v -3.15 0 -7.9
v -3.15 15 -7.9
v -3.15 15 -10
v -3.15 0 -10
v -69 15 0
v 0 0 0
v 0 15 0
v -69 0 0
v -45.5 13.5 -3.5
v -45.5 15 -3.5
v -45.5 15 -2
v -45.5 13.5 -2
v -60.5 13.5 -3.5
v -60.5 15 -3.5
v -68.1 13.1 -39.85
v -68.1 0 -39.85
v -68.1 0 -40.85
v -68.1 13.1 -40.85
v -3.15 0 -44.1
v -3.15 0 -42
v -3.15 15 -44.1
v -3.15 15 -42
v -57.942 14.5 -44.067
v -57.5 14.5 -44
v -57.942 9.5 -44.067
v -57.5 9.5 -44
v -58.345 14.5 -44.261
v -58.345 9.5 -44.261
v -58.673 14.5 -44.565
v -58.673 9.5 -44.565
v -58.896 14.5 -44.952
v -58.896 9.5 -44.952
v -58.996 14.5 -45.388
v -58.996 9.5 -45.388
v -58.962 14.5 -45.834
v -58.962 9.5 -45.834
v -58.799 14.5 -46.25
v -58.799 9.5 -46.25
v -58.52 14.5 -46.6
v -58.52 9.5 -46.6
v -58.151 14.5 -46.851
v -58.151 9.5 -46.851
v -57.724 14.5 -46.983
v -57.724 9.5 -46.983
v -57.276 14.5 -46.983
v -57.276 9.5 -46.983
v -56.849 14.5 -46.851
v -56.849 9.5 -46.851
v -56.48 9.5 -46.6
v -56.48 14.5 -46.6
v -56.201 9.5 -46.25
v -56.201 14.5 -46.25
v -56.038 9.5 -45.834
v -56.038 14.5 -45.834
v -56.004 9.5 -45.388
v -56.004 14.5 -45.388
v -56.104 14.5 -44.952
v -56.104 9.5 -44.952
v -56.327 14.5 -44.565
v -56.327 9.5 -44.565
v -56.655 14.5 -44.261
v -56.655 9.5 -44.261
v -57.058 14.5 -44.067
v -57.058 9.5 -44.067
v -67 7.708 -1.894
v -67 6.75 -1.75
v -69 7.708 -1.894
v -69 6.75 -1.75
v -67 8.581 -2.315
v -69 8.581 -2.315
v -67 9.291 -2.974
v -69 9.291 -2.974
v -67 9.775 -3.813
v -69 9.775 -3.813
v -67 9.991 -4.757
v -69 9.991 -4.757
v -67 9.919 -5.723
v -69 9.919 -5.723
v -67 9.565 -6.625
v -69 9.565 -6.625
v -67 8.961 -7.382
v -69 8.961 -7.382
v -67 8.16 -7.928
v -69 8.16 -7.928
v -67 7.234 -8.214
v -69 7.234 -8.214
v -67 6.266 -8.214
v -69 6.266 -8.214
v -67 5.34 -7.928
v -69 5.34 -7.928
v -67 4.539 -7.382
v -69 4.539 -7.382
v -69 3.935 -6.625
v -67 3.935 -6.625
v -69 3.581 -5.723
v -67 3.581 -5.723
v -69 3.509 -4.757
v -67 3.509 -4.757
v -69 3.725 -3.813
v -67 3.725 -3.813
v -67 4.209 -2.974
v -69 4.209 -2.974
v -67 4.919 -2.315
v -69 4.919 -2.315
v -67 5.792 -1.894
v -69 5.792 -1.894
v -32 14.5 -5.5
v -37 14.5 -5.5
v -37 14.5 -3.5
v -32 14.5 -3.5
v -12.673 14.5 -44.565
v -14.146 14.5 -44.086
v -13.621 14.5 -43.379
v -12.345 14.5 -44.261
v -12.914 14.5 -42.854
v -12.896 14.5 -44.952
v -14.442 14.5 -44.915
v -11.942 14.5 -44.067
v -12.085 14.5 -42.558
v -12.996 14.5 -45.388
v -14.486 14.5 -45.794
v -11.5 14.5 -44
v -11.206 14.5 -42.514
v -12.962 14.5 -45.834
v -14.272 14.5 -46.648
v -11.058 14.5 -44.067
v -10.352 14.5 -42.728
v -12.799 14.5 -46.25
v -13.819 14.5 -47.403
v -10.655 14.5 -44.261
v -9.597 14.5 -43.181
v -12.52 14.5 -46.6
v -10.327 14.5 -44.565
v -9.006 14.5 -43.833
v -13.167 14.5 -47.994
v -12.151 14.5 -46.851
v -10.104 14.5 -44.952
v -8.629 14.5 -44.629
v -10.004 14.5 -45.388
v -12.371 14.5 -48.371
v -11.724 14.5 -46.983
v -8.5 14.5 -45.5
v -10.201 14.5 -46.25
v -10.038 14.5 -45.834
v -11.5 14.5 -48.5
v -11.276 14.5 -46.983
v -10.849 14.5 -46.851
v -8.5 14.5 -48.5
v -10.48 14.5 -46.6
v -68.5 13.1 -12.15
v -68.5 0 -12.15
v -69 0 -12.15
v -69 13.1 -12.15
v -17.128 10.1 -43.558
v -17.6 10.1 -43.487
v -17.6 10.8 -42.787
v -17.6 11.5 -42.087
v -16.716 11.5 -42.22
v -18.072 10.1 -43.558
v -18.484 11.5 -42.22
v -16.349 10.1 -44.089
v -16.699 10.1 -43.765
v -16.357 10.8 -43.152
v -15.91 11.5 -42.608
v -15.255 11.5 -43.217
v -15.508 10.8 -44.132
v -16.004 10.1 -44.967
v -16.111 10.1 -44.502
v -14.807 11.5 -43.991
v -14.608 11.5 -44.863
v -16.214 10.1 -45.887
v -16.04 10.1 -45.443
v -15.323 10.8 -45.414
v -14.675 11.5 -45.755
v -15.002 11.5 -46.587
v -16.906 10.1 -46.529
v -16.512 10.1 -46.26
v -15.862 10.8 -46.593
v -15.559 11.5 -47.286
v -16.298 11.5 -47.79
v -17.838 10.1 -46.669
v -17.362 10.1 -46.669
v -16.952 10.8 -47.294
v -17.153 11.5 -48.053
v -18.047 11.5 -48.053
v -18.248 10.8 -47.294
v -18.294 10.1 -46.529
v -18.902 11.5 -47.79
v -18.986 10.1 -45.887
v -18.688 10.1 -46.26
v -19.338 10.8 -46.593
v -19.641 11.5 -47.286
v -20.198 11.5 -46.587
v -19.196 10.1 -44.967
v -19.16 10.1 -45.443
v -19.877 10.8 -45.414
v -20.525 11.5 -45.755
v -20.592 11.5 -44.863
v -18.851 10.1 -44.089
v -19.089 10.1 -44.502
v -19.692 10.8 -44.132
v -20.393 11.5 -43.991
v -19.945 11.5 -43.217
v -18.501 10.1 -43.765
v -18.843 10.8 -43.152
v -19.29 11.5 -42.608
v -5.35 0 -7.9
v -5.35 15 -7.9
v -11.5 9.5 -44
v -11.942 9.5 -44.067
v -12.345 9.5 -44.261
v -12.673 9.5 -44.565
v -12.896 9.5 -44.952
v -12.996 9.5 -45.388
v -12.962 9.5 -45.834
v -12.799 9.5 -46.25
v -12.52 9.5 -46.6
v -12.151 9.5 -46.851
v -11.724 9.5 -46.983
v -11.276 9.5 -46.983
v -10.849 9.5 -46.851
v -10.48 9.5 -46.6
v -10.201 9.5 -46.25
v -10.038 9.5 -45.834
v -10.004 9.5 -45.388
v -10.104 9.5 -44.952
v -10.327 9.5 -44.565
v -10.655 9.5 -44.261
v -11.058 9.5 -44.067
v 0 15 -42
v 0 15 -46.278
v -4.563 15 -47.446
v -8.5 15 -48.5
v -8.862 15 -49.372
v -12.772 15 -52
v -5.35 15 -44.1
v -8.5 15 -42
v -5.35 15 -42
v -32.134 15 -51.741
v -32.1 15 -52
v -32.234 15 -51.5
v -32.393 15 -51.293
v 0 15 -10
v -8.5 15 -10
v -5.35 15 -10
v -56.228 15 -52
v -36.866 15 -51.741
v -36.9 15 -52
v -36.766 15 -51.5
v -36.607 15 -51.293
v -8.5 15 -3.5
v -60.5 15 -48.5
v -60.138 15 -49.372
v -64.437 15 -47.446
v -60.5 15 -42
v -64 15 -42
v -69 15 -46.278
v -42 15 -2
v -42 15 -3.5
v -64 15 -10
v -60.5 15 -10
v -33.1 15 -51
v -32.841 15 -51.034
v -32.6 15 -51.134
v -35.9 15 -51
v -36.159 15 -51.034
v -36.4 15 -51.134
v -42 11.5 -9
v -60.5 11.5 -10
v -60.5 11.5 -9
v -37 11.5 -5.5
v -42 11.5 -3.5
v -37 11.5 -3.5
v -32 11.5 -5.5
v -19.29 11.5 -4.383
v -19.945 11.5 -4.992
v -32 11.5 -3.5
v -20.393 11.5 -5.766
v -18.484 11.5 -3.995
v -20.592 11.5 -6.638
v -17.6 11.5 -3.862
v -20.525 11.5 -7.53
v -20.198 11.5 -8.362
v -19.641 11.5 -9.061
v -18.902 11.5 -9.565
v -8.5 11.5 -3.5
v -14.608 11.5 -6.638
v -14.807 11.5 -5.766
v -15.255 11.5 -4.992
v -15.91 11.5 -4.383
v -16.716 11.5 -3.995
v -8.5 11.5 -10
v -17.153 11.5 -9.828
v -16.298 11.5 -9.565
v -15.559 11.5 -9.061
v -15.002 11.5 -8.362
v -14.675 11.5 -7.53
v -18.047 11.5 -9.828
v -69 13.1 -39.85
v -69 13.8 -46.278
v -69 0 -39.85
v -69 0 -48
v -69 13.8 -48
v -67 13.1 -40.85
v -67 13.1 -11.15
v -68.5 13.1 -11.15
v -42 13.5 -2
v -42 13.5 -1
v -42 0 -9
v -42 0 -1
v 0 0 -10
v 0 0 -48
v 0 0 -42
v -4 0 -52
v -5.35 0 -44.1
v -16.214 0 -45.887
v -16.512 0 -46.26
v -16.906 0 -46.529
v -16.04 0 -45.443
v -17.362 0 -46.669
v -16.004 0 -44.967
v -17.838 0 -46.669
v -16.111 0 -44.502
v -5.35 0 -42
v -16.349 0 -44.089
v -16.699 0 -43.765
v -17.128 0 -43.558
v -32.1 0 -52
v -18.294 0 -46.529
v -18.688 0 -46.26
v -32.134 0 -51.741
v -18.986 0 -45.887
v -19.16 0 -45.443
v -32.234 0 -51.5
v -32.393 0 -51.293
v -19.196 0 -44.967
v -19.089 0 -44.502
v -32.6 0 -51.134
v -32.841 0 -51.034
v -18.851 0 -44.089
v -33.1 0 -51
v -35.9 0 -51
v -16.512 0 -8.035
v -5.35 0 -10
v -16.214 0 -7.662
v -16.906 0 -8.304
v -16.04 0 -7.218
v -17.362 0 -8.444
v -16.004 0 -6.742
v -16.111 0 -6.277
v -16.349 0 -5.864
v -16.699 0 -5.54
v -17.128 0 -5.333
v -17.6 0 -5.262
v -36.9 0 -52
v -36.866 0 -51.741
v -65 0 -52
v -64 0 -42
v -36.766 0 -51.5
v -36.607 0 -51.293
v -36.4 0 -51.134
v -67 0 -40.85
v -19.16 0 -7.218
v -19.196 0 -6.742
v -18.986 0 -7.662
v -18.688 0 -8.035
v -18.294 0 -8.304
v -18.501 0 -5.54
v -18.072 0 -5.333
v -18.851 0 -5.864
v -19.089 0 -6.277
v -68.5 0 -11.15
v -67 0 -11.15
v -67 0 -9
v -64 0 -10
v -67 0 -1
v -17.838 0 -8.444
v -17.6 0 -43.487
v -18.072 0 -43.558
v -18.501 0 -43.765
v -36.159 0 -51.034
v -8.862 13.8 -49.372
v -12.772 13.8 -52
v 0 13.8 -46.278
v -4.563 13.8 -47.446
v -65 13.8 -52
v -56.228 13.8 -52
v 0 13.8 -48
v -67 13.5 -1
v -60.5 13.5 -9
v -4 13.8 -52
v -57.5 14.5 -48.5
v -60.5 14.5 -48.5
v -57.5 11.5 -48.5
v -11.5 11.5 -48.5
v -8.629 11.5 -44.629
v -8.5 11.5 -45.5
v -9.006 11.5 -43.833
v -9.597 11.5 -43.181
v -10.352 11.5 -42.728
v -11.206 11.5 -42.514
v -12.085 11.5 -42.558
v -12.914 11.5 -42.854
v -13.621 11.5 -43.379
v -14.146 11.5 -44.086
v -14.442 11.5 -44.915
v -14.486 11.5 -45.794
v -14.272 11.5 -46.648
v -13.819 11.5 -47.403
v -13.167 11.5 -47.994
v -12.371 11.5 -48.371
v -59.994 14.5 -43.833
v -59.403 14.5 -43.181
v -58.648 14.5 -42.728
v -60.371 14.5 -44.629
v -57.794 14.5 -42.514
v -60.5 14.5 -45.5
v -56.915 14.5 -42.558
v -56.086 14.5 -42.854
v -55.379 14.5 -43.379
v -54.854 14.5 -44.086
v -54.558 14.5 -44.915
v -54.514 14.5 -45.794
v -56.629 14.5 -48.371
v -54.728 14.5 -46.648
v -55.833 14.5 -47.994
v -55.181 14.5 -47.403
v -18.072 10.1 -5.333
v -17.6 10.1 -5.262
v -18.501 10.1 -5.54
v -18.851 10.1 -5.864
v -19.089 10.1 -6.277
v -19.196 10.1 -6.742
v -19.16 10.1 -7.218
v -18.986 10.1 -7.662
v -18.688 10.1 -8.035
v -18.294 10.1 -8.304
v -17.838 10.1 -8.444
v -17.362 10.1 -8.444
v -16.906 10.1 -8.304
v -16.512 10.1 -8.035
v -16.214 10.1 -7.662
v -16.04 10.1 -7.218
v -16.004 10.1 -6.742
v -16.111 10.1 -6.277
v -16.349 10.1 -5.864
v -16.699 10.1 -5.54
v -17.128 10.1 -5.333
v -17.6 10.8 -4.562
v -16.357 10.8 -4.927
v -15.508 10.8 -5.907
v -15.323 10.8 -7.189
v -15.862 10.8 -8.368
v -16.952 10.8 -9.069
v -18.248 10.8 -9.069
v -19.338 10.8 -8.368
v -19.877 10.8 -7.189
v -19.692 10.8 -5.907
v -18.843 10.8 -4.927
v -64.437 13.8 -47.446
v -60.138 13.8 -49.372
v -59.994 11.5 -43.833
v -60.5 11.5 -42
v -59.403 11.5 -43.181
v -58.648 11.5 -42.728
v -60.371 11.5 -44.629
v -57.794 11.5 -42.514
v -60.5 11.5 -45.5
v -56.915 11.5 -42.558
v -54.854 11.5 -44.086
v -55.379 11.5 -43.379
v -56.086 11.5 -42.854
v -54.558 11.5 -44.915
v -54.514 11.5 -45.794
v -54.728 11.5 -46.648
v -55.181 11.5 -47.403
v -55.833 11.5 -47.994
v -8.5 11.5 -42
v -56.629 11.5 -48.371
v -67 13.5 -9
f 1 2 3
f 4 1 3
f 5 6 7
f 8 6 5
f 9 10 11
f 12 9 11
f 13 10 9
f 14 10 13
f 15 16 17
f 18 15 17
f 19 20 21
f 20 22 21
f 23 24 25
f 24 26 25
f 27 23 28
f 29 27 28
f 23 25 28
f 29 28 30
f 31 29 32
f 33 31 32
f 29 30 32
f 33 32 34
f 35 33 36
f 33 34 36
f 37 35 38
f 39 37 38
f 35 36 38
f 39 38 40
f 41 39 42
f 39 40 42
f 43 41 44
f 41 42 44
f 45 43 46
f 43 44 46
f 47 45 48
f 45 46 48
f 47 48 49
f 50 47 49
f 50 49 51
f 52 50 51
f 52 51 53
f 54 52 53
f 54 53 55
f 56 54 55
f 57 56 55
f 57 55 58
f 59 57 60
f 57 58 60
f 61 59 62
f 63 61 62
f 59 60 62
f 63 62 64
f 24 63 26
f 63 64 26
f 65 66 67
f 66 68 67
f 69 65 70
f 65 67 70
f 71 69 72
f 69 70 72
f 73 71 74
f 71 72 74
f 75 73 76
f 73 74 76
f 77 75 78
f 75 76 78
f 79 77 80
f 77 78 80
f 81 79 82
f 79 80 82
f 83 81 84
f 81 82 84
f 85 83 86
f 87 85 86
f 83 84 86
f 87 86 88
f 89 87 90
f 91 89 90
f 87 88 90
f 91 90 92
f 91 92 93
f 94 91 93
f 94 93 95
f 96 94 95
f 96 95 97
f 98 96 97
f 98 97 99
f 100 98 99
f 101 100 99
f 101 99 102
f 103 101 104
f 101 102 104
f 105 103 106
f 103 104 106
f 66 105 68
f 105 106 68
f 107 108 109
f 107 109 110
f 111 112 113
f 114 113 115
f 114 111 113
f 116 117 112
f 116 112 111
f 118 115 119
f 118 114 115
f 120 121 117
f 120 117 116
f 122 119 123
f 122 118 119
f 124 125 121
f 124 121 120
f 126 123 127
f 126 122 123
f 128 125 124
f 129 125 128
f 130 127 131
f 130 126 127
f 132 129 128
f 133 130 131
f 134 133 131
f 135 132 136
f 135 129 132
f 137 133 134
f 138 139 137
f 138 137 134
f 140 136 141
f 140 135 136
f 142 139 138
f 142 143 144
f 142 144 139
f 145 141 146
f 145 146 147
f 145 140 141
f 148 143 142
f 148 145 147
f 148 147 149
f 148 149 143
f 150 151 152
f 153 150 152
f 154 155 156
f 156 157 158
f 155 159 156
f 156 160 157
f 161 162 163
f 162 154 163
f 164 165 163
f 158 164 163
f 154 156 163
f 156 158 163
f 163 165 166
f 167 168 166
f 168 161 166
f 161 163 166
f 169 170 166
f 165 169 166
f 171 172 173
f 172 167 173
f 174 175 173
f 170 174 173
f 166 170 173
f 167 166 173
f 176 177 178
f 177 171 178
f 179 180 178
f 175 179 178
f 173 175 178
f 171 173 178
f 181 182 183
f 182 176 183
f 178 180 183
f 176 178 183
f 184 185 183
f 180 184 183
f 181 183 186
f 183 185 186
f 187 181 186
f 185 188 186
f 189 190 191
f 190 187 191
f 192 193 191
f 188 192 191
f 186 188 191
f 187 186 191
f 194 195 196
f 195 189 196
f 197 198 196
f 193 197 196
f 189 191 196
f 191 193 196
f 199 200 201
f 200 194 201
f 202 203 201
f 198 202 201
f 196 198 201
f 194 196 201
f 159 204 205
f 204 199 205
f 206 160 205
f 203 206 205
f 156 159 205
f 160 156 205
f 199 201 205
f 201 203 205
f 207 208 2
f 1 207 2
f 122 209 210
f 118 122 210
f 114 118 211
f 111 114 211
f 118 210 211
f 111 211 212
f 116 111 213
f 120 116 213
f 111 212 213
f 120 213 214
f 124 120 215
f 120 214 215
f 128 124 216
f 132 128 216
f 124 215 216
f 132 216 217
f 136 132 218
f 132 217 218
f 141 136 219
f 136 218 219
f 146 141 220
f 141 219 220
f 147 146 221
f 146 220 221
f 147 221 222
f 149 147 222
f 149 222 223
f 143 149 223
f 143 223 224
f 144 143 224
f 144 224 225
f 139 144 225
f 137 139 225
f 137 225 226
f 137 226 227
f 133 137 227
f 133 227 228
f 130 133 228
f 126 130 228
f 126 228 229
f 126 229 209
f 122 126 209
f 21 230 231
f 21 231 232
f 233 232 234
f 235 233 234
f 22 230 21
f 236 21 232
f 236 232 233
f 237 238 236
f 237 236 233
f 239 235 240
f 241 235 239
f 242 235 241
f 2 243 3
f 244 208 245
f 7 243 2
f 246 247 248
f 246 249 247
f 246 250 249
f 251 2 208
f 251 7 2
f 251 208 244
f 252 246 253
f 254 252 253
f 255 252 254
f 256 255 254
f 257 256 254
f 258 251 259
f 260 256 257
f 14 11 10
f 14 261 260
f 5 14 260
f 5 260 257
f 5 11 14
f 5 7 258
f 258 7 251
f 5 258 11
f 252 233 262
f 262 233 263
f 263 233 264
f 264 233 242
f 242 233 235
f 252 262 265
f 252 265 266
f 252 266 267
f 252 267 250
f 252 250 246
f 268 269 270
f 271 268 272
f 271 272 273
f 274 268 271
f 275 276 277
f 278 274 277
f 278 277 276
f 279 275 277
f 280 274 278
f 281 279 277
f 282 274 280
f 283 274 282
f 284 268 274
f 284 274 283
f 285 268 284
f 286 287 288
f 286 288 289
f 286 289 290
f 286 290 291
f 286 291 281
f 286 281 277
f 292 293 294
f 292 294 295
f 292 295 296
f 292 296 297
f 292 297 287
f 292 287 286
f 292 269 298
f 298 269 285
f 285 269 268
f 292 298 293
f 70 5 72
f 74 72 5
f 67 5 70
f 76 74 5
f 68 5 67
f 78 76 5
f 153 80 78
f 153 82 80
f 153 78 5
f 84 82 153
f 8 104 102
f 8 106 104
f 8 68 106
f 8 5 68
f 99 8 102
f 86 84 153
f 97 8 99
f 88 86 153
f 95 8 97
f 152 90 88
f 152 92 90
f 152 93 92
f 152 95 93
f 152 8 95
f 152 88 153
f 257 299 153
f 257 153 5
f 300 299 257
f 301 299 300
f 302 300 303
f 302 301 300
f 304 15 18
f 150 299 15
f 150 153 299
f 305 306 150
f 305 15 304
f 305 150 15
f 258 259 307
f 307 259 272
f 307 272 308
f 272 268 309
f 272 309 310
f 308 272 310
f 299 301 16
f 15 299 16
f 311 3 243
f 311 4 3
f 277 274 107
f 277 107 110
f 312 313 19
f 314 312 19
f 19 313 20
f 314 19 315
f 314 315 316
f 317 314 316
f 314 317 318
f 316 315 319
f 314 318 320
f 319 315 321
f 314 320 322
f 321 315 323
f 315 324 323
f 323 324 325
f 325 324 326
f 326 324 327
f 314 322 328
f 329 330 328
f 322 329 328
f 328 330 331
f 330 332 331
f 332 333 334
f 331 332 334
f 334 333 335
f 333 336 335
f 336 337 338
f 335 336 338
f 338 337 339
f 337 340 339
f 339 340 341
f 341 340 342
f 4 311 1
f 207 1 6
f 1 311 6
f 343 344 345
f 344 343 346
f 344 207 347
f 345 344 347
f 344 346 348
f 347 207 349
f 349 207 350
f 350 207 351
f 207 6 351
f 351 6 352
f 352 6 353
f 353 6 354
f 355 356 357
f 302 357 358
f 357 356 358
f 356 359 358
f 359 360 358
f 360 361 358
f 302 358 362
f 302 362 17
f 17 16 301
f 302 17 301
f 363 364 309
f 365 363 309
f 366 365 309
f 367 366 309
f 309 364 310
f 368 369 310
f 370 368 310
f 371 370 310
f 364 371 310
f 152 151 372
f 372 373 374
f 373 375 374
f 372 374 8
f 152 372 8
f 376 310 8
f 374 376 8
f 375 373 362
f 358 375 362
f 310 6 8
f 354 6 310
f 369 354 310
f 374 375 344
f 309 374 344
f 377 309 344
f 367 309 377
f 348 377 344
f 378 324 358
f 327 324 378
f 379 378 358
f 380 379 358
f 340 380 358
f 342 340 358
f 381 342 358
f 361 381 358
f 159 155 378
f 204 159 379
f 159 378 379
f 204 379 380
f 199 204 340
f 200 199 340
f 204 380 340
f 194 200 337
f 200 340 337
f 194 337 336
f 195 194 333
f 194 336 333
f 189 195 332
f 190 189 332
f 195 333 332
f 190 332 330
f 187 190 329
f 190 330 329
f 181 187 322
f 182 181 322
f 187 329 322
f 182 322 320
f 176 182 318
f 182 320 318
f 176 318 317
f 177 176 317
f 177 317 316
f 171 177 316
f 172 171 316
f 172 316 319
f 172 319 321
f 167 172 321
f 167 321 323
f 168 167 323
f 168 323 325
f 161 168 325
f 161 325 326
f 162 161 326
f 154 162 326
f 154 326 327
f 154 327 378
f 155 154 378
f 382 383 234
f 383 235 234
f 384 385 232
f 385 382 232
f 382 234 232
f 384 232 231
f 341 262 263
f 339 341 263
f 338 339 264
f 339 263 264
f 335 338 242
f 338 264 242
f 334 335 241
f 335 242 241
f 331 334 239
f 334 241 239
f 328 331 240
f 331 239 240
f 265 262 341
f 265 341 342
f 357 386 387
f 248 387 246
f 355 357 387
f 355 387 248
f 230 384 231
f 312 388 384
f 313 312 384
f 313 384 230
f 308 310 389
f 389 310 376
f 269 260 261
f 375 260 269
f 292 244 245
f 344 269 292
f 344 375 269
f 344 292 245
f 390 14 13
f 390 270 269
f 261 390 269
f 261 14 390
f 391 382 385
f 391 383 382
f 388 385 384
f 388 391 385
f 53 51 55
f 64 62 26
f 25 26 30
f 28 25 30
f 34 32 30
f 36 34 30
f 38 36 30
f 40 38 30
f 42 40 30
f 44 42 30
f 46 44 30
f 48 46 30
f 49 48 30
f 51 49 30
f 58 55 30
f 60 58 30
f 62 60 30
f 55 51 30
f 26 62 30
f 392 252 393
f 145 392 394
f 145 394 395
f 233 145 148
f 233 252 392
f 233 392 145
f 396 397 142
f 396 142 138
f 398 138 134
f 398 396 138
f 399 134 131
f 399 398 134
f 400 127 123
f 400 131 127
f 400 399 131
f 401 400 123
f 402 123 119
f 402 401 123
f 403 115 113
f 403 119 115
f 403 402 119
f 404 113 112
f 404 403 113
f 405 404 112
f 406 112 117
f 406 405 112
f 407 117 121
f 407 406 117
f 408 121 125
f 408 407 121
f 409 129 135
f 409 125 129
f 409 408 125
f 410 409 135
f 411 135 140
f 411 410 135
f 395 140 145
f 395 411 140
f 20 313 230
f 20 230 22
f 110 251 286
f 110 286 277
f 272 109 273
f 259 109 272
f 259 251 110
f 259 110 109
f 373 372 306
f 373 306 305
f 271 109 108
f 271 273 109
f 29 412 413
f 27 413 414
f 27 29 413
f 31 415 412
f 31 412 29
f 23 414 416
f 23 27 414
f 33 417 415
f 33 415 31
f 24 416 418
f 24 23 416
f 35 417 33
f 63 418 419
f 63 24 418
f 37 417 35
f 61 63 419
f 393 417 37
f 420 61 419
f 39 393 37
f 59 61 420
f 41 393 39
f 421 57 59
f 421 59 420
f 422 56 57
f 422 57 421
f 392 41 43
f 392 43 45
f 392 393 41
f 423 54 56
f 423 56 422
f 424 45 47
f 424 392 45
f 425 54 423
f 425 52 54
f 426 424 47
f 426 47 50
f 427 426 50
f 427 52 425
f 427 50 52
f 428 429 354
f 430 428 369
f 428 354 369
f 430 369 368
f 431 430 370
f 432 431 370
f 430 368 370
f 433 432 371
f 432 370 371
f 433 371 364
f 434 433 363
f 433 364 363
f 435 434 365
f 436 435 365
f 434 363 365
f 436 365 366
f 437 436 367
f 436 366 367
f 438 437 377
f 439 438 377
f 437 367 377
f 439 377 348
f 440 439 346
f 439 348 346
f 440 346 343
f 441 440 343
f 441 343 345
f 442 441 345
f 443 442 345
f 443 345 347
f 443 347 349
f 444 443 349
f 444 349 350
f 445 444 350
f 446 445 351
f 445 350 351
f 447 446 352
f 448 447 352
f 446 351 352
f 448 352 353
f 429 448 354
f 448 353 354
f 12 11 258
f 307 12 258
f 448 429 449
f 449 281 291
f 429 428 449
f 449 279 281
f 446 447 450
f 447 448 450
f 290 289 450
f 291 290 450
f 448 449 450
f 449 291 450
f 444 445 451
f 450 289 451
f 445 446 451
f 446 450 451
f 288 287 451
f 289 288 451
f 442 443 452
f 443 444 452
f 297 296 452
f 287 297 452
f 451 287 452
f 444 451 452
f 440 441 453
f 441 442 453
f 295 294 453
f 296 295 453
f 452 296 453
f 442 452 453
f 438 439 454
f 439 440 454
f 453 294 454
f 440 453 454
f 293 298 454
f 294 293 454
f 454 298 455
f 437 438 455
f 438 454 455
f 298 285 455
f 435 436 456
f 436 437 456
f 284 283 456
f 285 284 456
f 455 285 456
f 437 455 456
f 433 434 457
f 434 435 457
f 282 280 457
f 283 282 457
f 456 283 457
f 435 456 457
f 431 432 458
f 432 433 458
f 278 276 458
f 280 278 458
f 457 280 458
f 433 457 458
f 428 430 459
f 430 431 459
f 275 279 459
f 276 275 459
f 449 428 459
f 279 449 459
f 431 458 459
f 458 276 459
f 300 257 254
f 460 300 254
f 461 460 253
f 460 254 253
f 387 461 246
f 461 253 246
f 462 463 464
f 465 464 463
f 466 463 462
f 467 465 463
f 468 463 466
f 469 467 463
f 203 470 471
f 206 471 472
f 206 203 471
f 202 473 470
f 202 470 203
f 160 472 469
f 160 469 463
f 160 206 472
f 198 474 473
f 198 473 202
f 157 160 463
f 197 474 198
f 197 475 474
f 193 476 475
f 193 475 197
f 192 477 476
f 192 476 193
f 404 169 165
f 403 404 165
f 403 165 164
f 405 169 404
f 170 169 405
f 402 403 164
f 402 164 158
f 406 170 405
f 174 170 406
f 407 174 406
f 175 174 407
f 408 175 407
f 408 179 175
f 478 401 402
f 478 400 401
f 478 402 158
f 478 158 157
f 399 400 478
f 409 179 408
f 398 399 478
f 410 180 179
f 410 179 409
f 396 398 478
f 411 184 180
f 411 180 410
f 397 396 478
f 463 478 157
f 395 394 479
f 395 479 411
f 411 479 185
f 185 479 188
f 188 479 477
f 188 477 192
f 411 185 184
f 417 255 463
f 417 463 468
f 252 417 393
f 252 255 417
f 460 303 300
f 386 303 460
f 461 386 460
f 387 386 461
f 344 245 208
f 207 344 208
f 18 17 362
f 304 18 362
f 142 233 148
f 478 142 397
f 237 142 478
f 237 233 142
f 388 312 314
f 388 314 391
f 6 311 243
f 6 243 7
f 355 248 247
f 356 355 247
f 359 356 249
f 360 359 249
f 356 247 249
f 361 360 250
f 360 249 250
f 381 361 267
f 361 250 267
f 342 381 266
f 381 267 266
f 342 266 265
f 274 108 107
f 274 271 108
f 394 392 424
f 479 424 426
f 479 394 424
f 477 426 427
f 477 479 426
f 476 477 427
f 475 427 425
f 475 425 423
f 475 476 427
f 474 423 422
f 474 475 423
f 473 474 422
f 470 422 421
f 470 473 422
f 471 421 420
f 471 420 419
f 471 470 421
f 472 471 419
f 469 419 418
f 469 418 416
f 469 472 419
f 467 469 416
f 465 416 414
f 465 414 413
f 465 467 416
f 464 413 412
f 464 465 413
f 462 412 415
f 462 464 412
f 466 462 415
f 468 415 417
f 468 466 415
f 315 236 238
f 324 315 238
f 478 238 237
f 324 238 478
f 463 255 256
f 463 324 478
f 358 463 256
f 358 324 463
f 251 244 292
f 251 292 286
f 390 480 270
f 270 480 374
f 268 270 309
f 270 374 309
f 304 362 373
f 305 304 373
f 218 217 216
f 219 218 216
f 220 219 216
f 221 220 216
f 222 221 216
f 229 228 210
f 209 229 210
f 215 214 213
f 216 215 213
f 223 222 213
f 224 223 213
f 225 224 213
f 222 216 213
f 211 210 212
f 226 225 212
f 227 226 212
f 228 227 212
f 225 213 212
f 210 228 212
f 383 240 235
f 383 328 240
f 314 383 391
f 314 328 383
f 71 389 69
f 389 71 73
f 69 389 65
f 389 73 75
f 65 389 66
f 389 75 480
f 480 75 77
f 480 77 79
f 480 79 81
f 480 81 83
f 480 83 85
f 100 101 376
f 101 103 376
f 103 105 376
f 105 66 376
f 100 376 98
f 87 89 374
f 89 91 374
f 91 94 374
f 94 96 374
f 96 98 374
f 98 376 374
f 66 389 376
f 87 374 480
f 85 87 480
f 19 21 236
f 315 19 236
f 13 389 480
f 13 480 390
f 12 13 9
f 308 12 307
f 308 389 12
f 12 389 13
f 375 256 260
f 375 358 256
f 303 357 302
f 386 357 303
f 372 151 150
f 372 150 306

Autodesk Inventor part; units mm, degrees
ref_plane "YZ Plane" through (0, 0, 0) normal (1, 0, 0) x (0, 1, 0)
ref_plane "XZ Plane" through (0, 0, 0) normal (0, 1, 0) x (-1, 0, 0)
sketch "Эскиз1" plane through (0, 0, 0) normal (0, 1, 0) x (-1, 0, 0)
  line L0 (0, 0) -> (69, 0)
  line L1 (69, 0) -> (69, -52)
  line L2 (69, -52) -> (0, -52)
  line L3 (0, -52) -> (0, 0)
  line L4 (0, -26) -> (32, -26)
  line L5 (64, -10) -> (0, -10)
  line L6 (0, -10) -> (0, -42)
  line L7 (0, -42) -> (64, -42)
  line L8 (64, -42) -> (64, -10)
  line L9 (64, -10) -> (0, -42) construction
  line L10 (0, -10) -> (64, -42) construction
  line L11 (0, -10) -> (2, -10)
  point P0 (0, -10)
  dimension "d0" = 69
  dimension "d224" = 10
  dimension "d225" = 5
  dimension "d226" = 32
extrude "Выдавливание1" add sketch "Эскиз1" along normal blind 15 contours L0 L1 L2 L3 L7 L8 L5
sketch "Эскиз2" plane through (0, 15, 0) normal (0, 1, 0) x (1, 0, 0)
  line L0 (-8.5, 3.5) -> (-60.5, 3.5)
  line L1 (-60.5, 3.5) -> (-60.5, 48.5)
  line L2 (-60.5, 48.5) -> (-8.5, 48.5)
  line L3 (-8.5, 48.5) -> (-8.5, 3.5)
  line L4 (-8.5, 3.5) -> (-60.5, 48.5) construction
  line L5 (-60.5, 3.5) -> (-8.5, 48.5) construction
  line L6 (0, 0) -> (0, 10) projected
  line L7 (-69, 52) -> (-69, 0) projected
  line L8 (0, 52) -> (-69, 52) construction
  line L9 (0, 10) -> (0, 42) construction
  line L10 (-69, 26) -> (0, 26) construction
  point P0 (-34.5, 26)
  point P1 (-34.5, 26)
  point P2 (-60.5, 26)
  point P3 (-34.5, 26)
  dimension "d227" = 52
  dimension "d228" = 45
extrude "Выдавливание2" cut sketch "Эскиз2" against normal blind 3.5
sketch "Эскиз3" plane through (0, 11.5, 0) normal (0, 1, 0) x (1, 0, 0)
  circle A0 centre (-57.5, 45.5) radius 3
  circle A1 centre (-11.5, 45.5) radius 3
  line L0 (-60.5, 48.5) -> (-8.5, 48.5) projected
  line L1 (-8.5, 48.5) -> (-8.5, 42) projected
  line L2 (-8.5, 42) -> (-60.5, 42) projected
  line L3 (-60.5, 42) -> (-60.5, 48.5) projected
  line L4 (-60.5, 10) -> (-8.5, 10) projected
  line L5 (-8.5, 42) -> (-60.5, 42) projected
  line L6 (-8.5, 48.5) -> (-8.5, 42) projected
  line L7 (-60.5, 48.5) -> (-8.5, 48.5) projected
  line L8 (-60.5, 42) -> (-60.5, 48.5) projected
  line L9 (-60.5, 3.5) -> (-60.5, 10) projected
  line L10 (-8.5, 3.5) -> (-60.5, 3.5) projected
  line L11 (-8.5, 10) -> (-8.5, 3.5) projected
  line L12 (0, 10) -> (-64, 10) projected
  line L13 (-8.5, 3.5) -> (-60.5, 3.5) projected
  line L14 (-32, 3.5) -> (-37, 3.5)
  line L15 (-37, 3.5) -> (-37, 5.5)
  line L16 (-37, 5.5) -> (-32, 5.5)
  line L17 (-32, 5.5) -> (-32, 3.5)
  line L18 (-8.5, 3.5) -> (-60.5, 3.5) projected
  point P0 (-38, 39.1)
  point P1 (-60.5, 45.5)
  point P2 (-8.3, 39.1)
  point P3 (-5.8, 45.225)
  point P4 (-57.5, 48.5)
  point P5 (-11.5, 48.5)
  point P6 (-8.5, 42.24)
  point P7 (-8.5, 45.5)
  point P8 (-34.5, 3.5)
  dimension "d236" = 3
  dimension "d237" = 3
  dimension "d238" = 3
  dimension "d239" = 3
  dimension "d240" = 6
  dimension "d241" = 6
  dimension "d304" = 2
  dimension "d305" = 5
extrude "Выдавливание5" add sketch "Эскиз3" along normal blind 3 contours A0 | A0 L3 L0 | L0 L1 A1 | A1 | L15 L16 L17 L10
sketch "Эскиз4" plane through (-71.3, 14.5, -19.65) normal (0, 1, 0) x (0, 0, -1)
  arc A0 (25.85, -10.8) -> (28.85, -13.8) centre (25.85, -13.8) ccw projected
  arc A1 (28.85, -59.8) -> (25.85, -62.8) centre (25.85, -59.8) ccw projected
hole "Отверстие1" at (-57.5, 14.5, -45.5) at (-11.5, 14.5, -45.5) direction (0, -1, 0) diameter 3 depth 5
sketch "Эскиз32" plane through (0, 11.5, 0) normal (0, 1, 0) x (1, 0, 0)
  line L0 (-64, 10) -> (-64, 42) projected
  line L1 (-64, 47.775) -> (-43.5, 47.775) projected
  line L2 (-8.5, 3.5) -> (-60.5, 3.5) projected
  line L3 (-8.5, 10) -> (-8.5, 3.5) projected
  line L4 (-60.5, 48.5) -> (-8.5, 48.5) projected
  line L5 (-8.5, 48.5) -> (-8.5, 42) projected
  point P0 (0, 0)
  point P1 (-17.6, 6.862)
  point P2 (-5.3, 5.3)
  point P3 (-8.3, 2.3)
  point P4 (-64, 4.225)
  point P5 (-17.6, 45.087)
  dimension "d261" = 3.362
  dimension "d263" = 9.1
  dimension "d296" = 3.413
  dimension "d297" = 9.1
hole "Отверстие5" at (-17.6, 11.5, -6.862) at (-17.6, 11.5, -45.087) direction (0, -1, 0) diameter 3.2 end through all countersink diameter 6 countersink angle 90
sketch "Эскиз12" plane through (0, 15, 0) normal (0, -1, 0) x (1, 0, 0)
  line L0 (-60.5, -48.5) -> (-8.5, -48.5) projected
  line L1 (0, -52) -> (-69, -52) projected
  line L2 (-35.9, -52) -> (-33.1, -52) construction
  line L3 (-35.9, -53) -> (-33.1, -53)
  line L4 (-33.1, -51) -> (-35.9, -51)
  arc A0 (-35.9, -51) -> (-35.9, -53) centre (-35.9, -52) ccw
  arc A1 (-33.1, -53) -> (-33.1, -51) centre (-33.1, -52) ccw
  point P0 (-34.5, -52)
  dimension "d302" = 1.4
  dimension "d303" = 2
extrude "Выдавливание11" cut sketch "Эскиз12" along normal through all
sketch "Эскиз34" plane through (0, 15, 0) normal (0, 1, 0) x (1, 0, 0)
  line L0 (-5.35, 7.9) -> (-3.15, 7.9)
  line L1 (-3.15, 7.9) -> (-3.15, 10)
  line L2 (-3.15, 10) -> (-5.35, 10)
  line L3 (-5.35, 10) -> (-5.35, 7.9)
  line L4 (0, 10) -> (-8.5, 10) projected
  line L5 (-5.35, 42) -> (-3.15, 42)
  line L6 (-3.15, 42) -> (-3.15, 44.1)
  line L7 (-3.15, 44.1) -> (-5.35, 44.1)
  line L8 (-5.35, 44.1) -> (-5.35, 42)
  line L9 (-8.5, 42) -> (0, 42) projected
  point P0 (0, 0)
  point P1 (-4.25, 10)
  point P2 (-4.25, 42)
  dimension "d278" = 2.2
  dimension "d279" = 2.1
extrude "Выдавливание27" cut sketch "Эскиз34" against normal through all
sketch "Эскиз36" plane through (0, 0, 0) normal (0, -1, 0) x (1, 0, 0)
  line L0 (-64, -10) -> (-64, 0)
  line L1 (-69, 0) -> (0, 0) projected
  line L2 (-67, -9) -> (-42, -9)
  line L3 (-42, -9) -> (-42, -1)
  line L4 (-42, -1) -> (-67, -1)
  line L5 (-67, -1) -> (-67, -9)
  line L6 (-69, -52) -> (-69, 0) projected
  point P0 (-67, -5)
  point P1 (-64, -5)
  dimension "d285" = 2
  dimension "d286" = 8
  dimension "d287" = 25
extrude "Выдавливание29" cut sketch "Эскиз36" against normal blind 13.5
sketch "Эскиз37" plane through (-69, 0, -52) normal (-1, 0, 0) x (0, 0, 1)
  line L0 (43, 0) -> (51, 0) projected
  line L1 (43, 0) -> (43, 13.5) projected
  line L2 (43, 13.5) -> (51, 13.5) projected
  line L3 (51, 0) -> (51, 13.5) projected
  line L4 (43, 0) -> (43, 13.5) construction
  line L5 (43, 6.75) -> (51, 6.75) construction
  line L6 (51, 0) -> (51, 13.5) construction
  circle A0 centre (47, 6.75) radius 3.25
  point P0 (52, 0)
  dimension "d290" = 6.5
extrude "Выдавливание30" cut sketch "Эскиз37" against normal up to surface (2 mm away) contours A0
sketch "Эскиз38" plane through (0, 15, 0) normal (0, 1, 0) x (1, 0, 0)
  line L0 (-42, 3.5) -> (-45.5, 3.5)
  line L1 (-45.5, 3.5) -> (-45.5, 2)
  line L2 (-45.5, 2) -> (-42, 2)
  line L3 (-42, 2) -> (-42, 3.5)
  line L4 (-69, 0) -> (0, 0) projected
  line L5 (-42, 9) -> (-42, 3.5) projected
  dimension "d293" = 3.5
  dimension "d301" = 1.5
extrude "Выдавливание31" cut sketch "Эскиз38" against normal up to surface (1.5 mm away)
sketch "Эскиз30" plane through (0, 0, 0) normal (0, -1, 0) x (1, 0, 0)
  line L0 (-69, -39.85) -> (-67, -39.85)
  line L1 (-67, -39.85) -> (-67, -12.15)
  line L2 (-67, -12.15) -> (-69, -12.15)
  line L3 (-69, -12.15) -> (-69, -39.85)
  line L4 (-69, -52) -> (-69, 0) projected
  line L5 (-67, -39.85) -> (-68.1, -39.85)
  line L6 (-68.1, -39.85) -> (-68.1, -40.85)
  line L7 (-68.1, -40.85) -> (-67, -40.85)
  line L8 (-67, -40.85) -> (-67, -39.85)
  line L9 (-67, -12.15) -> (-68.5, -12.15)
  line L10 (-68.5, -12.15) -> (-68.5, -11.15)
  line L11 (-68.5, -11.15) -> (-67, -11.15)
  line L12 (-67, -11.15) -> (-67, -12.15)
  point P0 (0, 0)
  point P1 (-69, -26)
  point P2 (-68.5, -12.15)
  point P3 (-68.1, -39.85)
  dimension "d216" = 27.7
  dimension "d217" = 2
  dimension "d218" = 1.1
  dimension "d219" = 1
  dimension "d220" = 1.5
  dimension "d221" = 1
extrude "Выдавливание24" cut sketch "Эскиз30" against normal blind 13.1
chamfer "Фаска7" distance 4 angle 45 2 edges at (0, 7.5, -52) (-69, 7.5, -52)
sketch "Эскиз39" plane through (0, 15, 0) normal (0, 1, 0) x (1, 0, 0)
  line L0 (-69, 48) -> (-69, 0) construction
  line L1 (-69, 48) -> (-69, 73.55) construction
  line L2 (-69, 73.55) -> (-73.55, 73.55) construction
  line L3 (-73.55, 73.55) -> (-64.1507, 51.55) construction
  line L4 (-64.1507, 51.55) -> (-62.6872, 48.1245) construction
  circle A0 centre (-73.55, 73.55) radius 27.6488
  point P0 (0, 0)
  dimension "d316" = 25.55
  dimension "d317" = 4.55
  dimension "d319" = 22
  dimension "d320" = 3.725
  dimension "d321" = 23.134
extrude "Выдавливание32" cut sketch "Эскиз39" against normal blind 1.2
ref_plane "РабПлоскость7" through (-34.5, 0, 0) normal (-1, 0, 0) x (0, 0, 1)
mirror "Зеркальное отражение2" about plane through (-34.5, 0, 0) normal (-1, 0, 0) of "Выдавливание32"
properties part number "Стойка под электроннику"
